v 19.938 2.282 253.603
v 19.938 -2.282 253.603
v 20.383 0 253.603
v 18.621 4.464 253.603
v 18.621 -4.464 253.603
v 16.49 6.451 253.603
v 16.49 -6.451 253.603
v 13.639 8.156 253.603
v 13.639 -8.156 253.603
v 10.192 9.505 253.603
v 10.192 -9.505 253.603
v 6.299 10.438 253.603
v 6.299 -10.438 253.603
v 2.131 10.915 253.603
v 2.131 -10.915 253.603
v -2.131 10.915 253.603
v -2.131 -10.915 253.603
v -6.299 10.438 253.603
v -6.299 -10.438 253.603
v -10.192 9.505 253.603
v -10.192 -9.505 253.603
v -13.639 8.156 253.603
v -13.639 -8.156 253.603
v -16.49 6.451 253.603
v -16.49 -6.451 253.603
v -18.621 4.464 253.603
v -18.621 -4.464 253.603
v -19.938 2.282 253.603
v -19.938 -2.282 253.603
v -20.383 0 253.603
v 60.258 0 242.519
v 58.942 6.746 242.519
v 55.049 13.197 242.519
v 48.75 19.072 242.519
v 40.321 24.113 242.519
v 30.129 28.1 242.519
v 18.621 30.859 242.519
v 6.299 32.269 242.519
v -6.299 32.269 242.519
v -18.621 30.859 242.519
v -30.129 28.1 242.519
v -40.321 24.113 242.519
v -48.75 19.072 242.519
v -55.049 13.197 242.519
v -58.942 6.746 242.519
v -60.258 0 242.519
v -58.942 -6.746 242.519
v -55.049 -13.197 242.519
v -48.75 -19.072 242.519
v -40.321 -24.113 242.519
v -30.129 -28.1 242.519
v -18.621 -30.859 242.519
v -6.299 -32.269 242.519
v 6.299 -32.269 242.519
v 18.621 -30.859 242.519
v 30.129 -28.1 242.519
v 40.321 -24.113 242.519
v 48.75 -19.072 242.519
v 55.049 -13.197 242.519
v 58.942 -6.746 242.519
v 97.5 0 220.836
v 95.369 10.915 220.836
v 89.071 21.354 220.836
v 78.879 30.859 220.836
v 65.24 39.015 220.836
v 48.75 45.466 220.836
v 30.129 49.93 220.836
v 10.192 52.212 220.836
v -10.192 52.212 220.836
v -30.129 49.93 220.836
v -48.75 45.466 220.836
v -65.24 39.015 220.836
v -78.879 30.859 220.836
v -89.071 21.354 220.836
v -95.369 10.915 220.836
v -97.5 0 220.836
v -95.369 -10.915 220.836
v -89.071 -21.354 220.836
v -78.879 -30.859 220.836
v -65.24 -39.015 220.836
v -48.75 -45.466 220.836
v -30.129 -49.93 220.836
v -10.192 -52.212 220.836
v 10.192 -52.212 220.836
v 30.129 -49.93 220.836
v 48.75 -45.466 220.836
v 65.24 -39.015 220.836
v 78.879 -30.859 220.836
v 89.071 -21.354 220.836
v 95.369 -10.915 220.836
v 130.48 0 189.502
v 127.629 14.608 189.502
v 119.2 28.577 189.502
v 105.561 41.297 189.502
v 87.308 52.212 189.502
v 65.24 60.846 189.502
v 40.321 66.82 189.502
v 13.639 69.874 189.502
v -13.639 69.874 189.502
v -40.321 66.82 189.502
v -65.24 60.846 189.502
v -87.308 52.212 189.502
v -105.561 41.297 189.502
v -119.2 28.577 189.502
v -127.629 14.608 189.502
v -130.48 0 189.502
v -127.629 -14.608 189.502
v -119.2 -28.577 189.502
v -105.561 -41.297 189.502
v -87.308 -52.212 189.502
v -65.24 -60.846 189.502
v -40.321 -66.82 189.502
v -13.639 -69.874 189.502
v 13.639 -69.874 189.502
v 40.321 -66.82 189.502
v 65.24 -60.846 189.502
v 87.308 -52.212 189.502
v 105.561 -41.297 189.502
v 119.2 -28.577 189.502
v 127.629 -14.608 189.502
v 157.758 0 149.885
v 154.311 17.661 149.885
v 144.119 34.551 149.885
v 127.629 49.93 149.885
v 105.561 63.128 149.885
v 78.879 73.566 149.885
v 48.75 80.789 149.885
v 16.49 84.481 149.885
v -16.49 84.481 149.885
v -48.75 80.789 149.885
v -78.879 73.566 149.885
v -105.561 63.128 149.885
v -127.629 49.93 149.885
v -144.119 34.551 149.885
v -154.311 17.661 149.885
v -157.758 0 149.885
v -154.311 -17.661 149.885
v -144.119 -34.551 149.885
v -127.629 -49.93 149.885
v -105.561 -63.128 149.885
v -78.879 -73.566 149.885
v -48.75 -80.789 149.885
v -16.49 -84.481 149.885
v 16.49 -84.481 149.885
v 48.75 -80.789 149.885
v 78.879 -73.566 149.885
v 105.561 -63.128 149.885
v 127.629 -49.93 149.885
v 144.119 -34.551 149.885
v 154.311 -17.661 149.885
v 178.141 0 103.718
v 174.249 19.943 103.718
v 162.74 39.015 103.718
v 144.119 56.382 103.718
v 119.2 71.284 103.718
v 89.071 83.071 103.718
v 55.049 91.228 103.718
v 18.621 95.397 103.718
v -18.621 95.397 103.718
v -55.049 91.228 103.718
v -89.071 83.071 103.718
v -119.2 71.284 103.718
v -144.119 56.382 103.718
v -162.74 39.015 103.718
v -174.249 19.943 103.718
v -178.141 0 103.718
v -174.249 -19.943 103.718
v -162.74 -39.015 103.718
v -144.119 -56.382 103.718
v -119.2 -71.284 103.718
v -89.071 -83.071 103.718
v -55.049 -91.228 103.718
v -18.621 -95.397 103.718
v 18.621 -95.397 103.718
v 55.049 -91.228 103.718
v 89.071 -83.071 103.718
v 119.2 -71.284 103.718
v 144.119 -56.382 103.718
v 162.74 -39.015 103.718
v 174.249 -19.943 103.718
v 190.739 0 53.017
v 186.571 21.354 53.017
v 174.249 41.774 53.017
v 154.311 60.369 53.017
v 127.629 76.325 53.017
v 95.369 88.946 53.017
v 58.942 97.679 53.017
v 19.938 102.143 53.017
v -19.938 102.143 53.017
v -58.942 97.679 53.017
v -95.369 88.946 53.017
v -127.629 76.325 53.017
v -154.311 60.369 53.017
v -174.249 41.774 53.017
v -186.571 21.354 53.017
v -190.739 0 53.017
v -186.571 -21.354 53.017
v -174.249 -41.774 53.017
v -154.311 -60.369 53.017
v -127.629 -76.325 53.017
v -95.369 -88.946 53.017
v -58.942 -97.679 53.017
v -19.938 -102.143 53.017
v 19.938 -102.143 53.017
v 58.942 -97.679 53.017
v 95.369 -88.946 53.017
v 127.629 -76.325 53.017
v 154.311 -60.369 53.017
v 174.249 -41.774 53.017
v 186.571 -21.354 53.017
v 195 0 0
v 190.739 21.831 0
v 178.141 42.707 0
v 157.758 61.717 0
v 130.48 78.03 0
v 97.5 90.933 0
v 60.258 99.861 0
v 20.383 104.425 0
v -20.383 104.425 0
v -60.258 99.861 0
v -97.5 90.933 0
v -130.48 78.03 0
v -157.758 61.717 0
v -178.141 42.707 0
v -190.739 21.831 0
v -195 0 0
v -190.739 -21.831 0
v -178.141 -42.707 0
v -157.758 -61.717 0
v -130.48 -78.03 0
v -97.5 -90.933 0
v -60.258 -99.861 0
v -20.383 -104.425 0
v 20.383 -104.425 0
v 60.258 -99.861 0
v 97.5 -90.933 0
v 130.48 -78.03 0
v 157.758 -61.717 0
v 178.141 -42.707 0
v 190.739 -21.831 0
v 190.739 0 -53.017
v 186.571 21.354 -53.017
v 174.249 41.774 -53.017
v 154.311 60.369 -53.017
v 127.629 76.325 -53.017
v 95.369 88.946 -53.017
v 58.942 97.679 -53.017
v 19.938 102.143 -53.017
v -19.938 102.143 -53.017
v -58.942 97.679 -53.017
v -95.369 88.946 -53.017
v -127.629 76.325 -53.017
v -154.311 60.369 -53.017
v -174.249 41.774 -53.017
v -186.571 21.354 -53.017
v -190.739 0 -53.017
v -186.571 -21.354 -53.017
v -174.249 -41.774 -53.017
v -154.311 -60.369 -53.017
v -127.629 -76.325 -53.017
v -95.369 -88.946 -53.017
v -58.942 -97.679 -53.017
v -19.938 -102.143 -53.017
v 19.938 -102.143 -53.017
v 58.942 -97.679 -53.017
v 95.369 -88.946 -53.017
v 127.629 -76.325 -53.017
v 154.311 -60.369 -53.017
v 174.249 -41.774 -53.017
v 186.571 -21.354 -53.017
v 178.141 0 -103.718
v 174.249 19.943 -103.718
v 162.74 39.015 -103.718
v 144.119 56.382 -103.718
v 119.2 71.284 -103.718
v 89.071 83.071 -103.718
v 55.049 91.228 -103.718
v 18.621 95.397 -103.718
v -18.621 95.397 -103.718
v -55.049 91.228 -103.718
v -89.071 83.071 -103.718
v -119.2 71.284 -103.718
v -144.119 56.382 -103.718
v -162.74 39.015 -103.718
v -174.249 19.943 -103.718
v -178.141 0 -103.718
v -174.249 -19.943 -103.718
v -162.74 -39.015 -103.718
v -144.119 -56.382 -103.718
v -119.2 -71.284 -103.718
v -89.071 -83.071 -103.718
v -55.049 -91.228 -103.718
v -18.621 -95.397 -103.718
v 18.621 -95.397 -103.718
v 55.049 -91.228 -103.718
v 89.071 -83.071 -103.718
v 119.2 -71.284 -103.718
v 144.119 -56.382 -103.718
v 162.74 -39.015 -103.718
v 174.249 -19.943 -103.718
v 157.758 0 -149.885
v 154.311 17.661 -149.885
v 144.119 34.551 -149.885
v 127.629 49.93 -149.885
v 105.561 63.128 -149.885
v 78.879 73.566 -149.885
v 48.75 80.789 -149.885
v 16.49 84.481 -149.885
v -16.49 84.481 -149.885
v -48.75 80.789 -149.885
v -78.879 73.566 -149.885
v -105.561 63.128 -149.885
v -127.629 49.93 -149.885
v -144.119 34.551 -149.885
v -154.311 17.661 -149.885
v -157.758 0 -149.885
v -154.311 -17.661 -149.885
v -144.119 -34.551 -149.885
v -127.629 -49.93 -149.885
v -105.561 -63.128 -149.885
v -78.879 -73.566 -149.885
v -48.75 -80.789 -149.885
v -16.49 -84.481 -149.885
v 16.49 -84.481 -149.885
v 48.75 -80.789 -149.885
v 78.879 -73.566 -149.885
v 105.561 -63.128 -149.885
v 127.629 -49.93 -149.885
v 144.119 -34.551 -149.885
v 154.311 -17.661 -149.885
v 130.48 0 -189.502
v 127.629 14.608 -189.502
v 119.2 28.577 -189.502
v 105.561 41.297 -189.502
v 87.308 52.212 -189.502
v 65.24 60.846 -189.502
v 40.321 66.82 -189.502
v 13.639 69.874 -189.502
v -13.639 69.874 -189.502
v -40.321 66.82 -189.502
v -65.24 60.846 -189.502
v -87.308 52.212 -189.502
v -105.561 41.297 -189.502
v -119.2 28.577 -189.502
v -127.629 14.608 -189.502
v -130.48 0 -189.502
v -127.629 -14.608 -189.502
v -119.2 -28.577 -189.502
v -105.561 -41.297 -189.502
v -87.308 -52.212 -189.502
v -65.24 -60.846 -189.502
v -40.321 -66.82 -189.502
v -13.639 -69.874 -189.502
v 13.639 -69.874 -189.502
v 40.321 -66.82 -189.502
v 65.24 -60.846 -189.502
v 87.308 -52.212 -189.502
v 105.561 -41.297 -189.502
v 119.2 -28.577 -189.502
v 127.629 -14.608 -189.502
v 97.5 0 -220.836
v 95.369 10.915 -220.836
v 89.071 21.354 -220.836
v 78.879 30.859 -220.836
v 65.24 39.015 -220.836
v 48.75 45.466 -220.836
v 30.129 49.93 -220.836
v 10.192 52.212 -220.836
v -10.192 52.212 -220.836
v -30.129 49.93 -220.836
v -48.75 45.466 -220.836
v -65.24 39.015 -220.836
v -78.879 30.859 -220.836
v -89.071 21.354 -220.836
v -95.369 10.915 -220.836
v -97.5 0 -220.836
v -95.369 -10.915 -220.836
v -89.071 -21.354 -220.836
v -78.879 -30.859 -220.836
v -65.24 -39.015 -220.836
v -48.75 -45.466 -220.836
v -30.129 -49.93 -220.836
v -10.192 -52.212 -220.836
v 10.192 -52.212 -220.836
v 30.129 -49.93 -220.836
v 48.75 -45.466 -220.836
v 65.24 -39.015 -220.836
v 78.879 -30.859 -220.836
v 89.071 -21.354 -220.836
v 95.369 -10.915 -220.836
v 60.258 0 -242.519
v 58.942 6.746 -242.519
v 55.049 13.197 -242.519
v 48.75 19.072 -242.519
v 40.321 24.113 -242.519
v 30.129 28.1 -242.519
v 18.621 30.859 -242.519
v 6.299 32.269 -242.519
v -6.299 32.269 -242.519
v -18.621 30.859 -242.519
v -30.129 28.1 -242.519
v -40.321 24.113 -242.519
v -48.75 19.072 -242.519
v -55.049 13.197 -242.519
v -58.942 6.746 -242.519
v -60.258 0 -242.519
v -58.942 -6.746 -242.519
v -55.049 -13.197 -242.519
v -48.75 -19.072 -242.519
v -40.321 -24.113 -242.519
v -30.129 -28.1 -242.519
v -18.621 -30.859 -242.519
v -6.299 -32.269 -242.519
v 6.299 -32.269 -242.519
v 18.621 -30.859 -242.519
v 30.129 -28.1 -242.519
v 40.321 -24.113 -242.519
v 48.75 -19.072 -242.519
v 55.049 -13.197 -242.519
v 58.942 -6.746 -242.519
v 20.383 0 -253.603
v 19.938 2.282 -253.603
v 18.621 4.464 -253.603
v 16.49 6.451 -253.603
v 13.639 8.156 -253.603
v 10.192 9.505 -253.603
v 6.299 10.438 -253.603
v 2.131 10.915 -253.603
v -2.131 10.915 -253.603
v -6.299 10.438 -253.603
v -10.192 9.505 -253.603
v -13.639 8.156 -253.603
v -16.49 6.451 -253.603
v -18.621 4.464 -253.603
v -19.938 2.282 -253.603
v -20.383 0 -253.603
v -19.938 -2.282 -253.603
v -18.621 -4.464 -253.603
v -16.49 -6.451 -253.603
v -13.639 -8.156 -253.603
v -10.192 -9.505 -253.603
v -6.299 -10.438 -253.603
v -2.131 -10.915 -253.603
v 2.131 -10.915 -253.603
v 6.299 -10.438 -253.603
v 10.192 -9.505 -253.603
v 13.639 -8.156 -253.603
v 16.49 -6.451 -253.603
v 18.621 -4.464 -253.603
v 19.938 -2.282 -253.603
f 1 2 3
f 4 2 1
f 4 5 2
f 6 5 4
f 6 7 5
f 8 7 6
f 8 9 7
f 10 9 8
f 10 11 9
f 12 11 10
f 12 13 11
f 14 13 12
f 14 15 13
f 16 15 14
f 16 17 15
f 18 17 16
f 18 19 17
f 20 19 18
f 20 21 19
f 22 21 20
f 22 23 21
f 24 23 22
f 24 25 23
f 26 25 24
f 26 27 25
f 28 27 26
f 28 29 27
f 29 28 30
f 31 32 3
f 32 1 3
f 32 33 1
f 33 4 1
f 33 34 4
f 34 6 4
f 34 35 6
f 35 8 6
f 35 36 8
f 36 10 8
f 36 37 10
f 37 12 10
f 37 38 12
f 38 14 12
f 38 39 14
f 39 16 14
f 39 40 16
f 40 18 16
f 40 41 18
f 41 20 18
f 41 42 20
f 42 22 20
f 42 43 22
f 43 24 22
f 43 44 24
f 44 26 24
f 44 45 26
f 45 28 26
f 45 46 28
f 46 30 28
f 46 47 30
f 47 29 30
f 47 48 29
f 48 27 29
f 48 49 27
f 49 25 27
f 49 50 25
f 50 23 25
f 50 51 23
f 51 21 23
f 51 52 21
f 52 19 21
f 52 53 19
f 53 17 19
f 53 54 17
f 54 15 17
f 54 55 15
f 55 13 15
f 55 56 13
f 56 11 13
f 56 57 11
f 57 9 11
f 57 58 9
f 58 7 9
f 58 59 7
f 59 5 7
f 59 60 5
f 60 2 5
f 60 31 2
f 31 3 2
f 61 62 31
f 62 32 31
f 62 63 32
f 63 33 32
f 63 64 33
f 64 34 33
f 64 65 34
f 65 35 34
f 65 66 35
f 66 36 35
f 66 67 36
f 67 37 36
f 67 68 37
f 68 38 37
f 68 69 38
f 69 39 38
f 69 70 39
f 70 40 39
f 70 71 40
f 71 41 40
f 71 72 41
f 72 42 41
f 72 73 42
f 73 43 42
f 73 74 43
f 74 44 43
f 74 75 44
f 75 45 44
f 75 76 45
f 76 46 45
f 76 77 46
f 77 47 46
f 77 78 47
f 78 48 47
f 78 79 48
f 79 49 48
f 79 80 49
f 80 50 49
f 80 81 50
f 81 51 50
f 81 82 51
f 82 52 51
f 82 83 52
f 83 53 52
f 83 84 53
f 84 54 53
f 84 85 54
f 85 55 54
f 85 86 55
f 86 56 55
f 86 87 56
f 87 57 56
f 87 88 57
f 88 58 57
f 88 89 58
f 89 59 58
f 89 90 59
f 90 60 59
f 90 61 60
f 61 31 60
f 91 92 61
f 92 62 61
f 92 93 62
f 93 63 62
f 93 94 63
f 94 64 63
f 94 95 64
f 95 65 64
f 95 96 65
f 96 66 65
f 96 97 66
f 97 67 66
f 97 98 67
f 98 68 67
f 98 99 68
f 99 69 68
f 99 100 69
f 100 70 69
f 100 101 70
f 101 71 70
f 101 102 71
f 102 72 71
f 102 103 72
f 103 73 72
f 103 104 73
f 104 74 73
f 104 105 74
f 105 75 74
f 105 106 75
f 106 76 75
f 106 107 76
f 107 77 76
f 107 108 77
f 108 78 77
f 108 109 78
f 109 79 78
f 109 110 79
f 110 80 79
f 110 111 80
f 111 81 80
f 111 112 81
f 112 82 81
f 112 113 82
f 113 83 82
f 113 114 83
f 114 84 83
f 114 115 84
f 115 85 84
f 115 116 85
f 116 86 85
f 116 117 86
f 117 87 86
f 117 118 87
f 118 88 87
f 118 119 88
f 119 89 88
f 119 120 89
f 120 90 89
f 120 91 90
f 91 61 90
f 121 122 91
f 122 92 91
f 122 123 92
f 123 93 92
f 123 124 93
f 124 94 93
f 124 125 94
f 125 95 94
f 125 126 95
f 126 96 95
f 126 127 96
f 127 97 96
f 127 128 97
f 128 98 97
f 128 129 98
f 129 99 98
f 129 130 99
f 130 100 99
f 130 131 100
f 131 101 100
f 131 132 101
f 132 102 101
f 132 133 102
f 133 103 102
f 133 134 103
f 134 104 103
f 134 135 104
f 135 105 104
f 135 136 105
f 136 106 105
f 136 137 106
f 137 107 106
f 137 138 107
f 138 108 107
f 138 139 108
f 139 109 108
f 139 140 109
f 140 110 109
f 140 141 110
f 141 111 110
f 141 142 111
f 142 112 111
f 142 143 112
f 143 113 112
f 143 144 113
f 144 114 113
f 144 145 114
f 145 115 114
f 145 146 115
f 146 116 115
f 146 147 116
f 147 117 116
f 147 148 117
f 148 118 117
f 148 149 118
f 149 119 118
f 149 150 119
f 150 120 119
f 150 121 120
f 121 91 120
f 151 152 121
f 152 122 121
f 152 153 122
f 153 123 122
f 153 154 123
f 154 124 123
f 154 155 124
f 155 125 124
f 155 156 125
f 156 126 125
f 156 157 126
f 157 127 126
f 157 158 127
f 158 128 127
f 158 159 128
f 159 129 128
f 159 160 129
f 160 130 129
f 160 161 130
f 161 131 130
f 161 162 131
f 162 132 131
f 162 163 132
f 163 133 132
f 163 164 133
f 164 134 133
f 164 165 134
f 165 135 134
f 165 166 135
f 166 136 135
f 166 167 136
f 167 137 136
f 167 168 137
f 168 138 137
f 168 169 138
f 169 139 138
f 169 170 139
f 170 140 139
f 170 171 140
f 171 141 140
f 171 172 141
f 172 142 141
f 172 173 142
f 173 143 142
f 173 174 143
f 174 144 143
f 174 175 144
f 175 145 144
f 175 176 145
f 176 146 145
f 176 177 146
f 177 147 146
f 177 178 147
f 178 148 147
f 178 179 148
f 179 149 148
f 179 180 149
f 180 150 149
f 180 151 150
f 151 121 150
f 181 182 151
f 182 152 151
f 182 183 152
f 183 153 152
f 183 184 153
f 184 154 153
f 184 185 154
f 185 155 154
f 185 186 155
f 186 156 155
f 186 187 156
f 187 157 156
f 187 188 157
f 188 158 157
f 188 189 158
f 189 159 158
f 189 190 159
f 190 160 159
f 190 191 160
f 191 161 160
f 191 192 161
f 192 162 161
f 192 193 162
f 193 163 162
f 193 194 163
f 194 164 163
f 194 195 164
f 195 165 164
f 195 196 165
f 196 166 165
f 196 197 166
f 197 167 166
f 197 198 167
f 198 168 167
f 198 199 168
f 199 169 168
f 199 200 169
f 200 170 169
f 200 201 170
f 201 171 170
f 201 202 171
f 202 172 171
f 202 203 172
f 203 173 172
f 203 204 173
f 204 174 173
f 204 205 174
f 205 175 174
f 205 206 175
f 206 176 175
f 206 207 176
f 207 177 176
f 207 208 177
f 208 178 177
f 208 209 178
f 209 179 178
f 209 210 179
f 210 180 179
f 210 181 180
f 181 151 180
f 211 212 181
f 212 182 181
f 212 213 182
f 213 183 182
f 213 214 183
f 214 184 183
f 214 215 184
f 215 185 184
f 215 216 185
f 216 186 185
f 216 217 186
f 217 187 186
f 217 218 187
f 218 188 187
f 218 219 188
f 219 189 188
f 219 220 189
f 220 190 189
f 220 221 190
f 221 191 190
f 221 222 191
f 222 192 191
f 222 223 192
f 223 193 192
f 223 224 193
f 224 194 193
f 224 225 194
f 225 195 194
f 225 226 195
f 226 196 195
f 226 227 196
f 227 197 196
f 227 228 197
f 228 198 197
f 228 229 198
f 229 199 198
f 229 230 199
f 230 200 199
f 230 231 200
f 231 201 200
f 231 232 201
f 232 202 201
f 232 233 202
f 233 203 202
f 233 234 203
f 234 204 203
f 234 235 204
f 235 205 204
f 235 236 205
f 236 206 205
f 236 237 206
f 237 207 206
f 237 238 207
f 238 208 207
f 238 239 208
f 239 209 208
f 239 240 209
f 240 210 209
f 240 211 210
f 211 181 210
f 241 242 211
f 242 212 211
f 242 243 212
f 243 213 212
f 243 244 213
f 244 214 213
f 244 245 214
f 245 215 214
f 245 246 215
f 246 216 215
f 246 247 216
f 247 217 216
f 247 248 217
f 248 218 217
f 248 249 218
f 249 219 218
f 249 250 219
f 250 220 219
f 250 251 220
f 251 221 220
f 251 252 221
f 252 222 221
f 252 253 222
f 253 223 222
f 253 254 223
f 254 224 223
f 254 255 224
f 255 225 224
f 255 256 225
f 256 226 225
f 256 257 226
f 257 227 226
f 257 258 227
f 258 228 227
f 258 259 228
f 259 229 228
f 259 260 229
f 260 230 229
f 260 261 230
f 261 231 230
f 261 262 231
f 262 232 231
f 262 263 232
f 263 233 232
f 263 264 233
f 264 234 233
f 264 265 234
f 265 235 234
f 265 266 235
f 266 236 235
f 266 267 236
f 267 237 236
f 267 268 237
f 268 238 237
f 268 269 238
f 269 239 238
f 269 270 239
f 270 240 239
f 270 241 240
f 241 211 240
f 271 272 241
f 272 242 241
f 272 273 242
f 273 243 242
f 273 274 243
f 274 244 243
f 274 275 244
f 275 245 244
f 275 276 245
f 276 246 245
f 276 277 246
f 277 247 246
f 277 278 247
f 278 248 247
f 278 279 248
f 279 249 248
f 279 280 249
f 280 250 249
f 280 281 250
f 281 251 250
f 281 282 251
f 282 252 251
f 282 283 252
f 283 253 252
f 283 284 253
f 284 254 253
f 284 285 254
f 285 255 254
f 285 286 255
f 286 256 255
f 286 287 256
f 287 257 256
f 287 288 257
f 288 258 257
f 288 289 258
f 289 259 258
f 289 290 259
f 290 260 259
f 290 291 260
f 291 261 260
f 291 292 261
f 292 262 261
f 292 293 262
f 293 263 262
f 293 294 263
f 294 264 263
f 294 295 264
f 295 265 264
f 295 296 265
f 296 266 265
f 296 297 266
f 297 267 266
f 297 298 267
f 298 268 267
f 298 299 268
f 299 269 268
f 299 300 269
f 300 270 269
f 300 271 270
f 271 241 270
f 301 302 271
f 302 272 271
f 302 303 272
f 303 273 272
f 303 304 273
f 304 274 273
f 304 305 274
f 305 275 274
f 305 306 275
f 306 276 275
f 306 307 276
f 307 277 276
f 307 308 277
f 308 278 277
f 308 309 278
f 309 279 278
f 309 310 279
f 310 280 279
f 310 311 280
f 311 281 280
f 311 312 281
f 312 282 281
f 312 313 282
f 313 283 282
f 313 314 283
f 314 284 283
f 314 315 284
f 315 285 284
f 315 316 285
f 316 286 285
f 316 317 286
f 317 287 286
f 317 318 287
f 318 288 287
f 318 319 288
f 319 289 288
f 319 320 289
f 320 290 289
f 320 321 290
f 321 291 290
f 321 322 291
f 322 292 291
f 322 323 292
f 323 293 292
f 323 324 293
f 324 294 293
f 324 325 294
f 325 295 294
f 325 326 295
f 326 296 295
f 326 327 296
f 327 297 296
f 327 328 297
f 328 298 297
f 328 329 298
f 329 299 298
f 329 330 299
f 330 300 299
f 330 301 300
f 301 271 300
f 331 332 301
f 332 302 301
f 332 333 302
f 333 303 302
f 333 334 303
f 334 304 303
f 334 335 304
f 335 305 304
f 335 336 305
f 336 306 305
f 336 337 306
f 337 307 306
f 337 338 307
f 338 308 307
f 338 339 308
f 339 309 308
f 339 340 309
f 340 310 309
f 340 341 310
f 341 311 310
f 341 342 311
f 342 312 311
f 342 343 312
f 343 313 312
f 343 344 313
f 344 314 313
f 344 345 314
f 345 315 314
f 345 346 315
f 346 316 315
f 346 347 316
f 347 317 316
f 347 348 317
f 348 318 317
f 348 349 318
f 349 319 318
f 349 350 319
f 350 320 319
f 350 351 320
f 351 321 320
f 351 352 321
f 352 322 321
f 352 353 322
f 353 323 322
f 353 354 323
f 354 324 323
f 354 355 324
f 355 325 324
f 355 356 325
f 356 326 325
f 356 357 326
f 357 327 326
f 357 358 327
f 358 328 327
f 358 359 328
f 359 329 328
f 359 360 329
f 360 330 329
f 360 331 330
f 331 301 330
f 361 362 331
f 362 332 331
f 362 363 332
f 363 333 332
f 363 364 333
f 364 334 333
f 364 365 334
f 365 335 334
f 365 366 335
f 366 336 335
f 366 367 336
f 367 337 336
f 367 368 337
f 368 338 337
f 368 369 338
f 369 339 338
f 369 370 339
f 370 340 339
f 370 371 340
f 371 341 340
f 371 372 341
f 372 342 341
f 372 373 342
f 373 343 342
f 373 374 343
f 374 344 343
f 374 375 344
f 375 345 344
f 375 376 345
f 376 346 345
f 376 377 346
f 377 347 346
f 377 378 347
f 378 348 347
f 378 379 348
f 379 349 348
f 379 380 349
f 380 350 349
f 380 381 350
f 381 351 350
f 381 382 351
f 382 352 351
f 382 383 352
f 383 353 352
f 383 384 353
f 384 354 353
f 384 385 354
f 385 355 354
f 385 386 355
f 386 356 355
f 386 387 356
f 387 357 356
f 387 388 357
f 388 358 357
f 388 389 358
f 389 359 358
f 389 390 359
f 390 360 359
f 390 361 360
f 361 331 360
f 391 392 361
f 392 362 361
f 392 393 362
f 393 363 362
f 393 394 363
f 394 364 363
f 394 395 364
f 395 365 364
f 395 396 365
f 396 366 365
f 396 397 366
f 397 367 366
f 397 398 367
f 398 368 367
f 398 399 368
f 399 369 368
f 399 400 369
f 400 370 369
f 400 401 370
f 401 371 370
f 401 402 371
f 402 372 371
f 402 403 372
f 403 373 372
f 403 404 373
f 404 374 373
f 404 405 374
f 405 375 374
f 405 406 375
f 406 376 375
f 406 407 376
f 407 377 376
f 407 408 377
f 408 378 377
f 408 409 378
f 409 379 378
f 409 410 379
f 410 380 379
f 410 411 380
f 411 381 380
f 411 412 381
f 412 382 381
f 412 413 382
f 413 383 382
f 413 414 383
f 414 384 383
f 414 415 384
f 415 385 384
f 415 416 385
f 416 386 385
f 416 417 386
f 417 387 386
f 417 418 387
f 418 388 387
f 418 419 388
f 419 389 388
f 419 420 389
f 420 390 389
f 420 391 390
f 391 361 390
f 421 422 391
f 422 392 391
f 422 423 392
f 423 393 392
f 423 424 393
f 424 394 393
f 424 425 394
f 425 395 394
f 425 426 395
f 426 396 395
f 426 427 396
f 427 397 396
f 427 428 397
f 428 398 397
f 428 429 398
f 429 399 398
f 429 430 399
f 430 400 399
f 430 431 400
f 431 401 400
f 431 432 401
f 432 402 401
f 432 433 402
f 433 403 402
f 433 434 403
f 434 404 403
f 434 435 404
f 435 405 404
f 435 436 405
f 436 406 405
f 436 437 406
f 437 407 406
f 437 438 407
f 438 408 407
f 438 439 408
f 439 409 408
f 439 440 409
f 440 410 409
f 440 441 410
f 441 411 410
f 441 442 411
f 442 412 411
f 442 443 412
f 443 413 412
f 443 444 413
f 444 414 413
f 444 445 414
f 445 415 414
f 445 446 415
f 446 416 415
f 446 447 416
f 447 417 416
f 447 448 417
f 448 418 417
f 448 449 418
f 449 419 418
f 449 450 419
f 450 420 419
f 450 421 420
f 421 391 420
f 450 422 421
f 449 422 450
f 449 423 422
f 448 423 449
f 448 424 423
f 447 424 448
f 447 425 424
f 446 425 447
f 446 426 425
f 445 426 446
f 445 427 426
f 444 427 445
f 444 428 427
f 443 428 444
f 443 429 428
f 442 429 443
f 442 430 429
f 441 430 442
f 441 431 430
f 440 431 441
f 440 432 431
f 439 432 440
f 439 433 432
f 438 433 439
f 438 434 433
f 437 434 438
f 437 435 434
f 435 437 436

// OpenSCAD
// Generated by SolidPython 1.0.1 on 2020-07-29 00:46:50


scale(v = [13, 7, 17]) {
	sphere(r = 15);
}
/***********************************************
*********      SolidPython code:      **********
************************************************
 
# import packages: SolidPython
from solid import *
from solid.utils import *
from itertools import chain, combinations, permutations


class Resize:

    def __init__(self, scad_file):
        self.scad_file = scad_file
        #self.scad_file = import_scad(scad_file)
        # cone/cylinder param:
        self.r1 = 0
        self.r2 = 0
        self.h = 0
        # rectangular prism param:
        self.w = 0
        self.l = 0
        # ellipse param:
        self.r = 0

    # import OpenScad code (file name corresponds to shape)


    # classify shape + parameters
    def assign(self, param1, param2, param3):
        if self.scad_file == 'cone.scad':
            self.r1 = param1
            self.r2 = param2
            self.h = param3
        elif self.scad_file == 'cylinder.scad':
            self.r1 = param1
            self.r2 = param2
            self.h = param3
        elif self.scad_file == 'rectangularPrism.scad':
            self.h = param1
            self.l = param2
            self.w = param3
        else:
            self.r = param1
            self.h = param2

    # resize parameters
    def iterate(self):
        x = range(3, 20, 2)
        i = 1
        if self.scad_file == 'cone.scad':
            tempList = list(permutations(x, 2))
            for temp in tempList:
                param1 = temp[0]
                param2 = temp[1]
                filepath = 'produced_scad_files/' + 'cone' + str(param1) + '_' + str(param2) + '_' + '.scad'
                scad_render_to_file(cylinder(h=param1, r1=param2, r2=0), filepath)

        elif self.scad_file == 'cylinder.scad':
            tempList = list(permutations(x, 3))
            for temp in tempList:
                param1 = temp[0]
                param2 = temp[1]
                filepath = 'produced_scad_files/' + 'cylinder' + str(param1) + '_' + str(param2) + '_' + '.scad'
                scad_render_to_file(cylinder(h=param1, r1=param2, r2=param2), filepath)

        elif self.scad_file == 'rectangularPrism.scad':
            tempList = list(permutations(x, 3))
            for temp in tempList:
                param1 = temp[0]
                param2 = temp[1]
                param3 = temp[2]
                filepath = 'produced_scad_files/' + 'rectangularPrism' + str(param1) + '_' + str(param2) + '_' + str(
                    param3) + '.scad'
                scad_render_to_file(cube(size=(param1, param2, param3)), filepath)

        elif self.scad_file == 'ellipse.scad':
            tempList = list(permutations(x, 4))
            for temp in tempList:
                param1 = temp[0]
                param2 = temp[1]
                param3 = temp[2]
                param4 = temp[3]
                filepath = 'produced_scad_files/' + 'ellipse' + str(param1) + '_' + str(param2) + '_' + str(param3) + '_' + str(param4) + '.scad'
                scad_render_to_file(scale([param1, param2, param3])(sphere(r=param4)), filepath)

    def render_to_scadfile(self):
        scad_render_to_file(scad, 'example.scad') 
 
************************************************/
